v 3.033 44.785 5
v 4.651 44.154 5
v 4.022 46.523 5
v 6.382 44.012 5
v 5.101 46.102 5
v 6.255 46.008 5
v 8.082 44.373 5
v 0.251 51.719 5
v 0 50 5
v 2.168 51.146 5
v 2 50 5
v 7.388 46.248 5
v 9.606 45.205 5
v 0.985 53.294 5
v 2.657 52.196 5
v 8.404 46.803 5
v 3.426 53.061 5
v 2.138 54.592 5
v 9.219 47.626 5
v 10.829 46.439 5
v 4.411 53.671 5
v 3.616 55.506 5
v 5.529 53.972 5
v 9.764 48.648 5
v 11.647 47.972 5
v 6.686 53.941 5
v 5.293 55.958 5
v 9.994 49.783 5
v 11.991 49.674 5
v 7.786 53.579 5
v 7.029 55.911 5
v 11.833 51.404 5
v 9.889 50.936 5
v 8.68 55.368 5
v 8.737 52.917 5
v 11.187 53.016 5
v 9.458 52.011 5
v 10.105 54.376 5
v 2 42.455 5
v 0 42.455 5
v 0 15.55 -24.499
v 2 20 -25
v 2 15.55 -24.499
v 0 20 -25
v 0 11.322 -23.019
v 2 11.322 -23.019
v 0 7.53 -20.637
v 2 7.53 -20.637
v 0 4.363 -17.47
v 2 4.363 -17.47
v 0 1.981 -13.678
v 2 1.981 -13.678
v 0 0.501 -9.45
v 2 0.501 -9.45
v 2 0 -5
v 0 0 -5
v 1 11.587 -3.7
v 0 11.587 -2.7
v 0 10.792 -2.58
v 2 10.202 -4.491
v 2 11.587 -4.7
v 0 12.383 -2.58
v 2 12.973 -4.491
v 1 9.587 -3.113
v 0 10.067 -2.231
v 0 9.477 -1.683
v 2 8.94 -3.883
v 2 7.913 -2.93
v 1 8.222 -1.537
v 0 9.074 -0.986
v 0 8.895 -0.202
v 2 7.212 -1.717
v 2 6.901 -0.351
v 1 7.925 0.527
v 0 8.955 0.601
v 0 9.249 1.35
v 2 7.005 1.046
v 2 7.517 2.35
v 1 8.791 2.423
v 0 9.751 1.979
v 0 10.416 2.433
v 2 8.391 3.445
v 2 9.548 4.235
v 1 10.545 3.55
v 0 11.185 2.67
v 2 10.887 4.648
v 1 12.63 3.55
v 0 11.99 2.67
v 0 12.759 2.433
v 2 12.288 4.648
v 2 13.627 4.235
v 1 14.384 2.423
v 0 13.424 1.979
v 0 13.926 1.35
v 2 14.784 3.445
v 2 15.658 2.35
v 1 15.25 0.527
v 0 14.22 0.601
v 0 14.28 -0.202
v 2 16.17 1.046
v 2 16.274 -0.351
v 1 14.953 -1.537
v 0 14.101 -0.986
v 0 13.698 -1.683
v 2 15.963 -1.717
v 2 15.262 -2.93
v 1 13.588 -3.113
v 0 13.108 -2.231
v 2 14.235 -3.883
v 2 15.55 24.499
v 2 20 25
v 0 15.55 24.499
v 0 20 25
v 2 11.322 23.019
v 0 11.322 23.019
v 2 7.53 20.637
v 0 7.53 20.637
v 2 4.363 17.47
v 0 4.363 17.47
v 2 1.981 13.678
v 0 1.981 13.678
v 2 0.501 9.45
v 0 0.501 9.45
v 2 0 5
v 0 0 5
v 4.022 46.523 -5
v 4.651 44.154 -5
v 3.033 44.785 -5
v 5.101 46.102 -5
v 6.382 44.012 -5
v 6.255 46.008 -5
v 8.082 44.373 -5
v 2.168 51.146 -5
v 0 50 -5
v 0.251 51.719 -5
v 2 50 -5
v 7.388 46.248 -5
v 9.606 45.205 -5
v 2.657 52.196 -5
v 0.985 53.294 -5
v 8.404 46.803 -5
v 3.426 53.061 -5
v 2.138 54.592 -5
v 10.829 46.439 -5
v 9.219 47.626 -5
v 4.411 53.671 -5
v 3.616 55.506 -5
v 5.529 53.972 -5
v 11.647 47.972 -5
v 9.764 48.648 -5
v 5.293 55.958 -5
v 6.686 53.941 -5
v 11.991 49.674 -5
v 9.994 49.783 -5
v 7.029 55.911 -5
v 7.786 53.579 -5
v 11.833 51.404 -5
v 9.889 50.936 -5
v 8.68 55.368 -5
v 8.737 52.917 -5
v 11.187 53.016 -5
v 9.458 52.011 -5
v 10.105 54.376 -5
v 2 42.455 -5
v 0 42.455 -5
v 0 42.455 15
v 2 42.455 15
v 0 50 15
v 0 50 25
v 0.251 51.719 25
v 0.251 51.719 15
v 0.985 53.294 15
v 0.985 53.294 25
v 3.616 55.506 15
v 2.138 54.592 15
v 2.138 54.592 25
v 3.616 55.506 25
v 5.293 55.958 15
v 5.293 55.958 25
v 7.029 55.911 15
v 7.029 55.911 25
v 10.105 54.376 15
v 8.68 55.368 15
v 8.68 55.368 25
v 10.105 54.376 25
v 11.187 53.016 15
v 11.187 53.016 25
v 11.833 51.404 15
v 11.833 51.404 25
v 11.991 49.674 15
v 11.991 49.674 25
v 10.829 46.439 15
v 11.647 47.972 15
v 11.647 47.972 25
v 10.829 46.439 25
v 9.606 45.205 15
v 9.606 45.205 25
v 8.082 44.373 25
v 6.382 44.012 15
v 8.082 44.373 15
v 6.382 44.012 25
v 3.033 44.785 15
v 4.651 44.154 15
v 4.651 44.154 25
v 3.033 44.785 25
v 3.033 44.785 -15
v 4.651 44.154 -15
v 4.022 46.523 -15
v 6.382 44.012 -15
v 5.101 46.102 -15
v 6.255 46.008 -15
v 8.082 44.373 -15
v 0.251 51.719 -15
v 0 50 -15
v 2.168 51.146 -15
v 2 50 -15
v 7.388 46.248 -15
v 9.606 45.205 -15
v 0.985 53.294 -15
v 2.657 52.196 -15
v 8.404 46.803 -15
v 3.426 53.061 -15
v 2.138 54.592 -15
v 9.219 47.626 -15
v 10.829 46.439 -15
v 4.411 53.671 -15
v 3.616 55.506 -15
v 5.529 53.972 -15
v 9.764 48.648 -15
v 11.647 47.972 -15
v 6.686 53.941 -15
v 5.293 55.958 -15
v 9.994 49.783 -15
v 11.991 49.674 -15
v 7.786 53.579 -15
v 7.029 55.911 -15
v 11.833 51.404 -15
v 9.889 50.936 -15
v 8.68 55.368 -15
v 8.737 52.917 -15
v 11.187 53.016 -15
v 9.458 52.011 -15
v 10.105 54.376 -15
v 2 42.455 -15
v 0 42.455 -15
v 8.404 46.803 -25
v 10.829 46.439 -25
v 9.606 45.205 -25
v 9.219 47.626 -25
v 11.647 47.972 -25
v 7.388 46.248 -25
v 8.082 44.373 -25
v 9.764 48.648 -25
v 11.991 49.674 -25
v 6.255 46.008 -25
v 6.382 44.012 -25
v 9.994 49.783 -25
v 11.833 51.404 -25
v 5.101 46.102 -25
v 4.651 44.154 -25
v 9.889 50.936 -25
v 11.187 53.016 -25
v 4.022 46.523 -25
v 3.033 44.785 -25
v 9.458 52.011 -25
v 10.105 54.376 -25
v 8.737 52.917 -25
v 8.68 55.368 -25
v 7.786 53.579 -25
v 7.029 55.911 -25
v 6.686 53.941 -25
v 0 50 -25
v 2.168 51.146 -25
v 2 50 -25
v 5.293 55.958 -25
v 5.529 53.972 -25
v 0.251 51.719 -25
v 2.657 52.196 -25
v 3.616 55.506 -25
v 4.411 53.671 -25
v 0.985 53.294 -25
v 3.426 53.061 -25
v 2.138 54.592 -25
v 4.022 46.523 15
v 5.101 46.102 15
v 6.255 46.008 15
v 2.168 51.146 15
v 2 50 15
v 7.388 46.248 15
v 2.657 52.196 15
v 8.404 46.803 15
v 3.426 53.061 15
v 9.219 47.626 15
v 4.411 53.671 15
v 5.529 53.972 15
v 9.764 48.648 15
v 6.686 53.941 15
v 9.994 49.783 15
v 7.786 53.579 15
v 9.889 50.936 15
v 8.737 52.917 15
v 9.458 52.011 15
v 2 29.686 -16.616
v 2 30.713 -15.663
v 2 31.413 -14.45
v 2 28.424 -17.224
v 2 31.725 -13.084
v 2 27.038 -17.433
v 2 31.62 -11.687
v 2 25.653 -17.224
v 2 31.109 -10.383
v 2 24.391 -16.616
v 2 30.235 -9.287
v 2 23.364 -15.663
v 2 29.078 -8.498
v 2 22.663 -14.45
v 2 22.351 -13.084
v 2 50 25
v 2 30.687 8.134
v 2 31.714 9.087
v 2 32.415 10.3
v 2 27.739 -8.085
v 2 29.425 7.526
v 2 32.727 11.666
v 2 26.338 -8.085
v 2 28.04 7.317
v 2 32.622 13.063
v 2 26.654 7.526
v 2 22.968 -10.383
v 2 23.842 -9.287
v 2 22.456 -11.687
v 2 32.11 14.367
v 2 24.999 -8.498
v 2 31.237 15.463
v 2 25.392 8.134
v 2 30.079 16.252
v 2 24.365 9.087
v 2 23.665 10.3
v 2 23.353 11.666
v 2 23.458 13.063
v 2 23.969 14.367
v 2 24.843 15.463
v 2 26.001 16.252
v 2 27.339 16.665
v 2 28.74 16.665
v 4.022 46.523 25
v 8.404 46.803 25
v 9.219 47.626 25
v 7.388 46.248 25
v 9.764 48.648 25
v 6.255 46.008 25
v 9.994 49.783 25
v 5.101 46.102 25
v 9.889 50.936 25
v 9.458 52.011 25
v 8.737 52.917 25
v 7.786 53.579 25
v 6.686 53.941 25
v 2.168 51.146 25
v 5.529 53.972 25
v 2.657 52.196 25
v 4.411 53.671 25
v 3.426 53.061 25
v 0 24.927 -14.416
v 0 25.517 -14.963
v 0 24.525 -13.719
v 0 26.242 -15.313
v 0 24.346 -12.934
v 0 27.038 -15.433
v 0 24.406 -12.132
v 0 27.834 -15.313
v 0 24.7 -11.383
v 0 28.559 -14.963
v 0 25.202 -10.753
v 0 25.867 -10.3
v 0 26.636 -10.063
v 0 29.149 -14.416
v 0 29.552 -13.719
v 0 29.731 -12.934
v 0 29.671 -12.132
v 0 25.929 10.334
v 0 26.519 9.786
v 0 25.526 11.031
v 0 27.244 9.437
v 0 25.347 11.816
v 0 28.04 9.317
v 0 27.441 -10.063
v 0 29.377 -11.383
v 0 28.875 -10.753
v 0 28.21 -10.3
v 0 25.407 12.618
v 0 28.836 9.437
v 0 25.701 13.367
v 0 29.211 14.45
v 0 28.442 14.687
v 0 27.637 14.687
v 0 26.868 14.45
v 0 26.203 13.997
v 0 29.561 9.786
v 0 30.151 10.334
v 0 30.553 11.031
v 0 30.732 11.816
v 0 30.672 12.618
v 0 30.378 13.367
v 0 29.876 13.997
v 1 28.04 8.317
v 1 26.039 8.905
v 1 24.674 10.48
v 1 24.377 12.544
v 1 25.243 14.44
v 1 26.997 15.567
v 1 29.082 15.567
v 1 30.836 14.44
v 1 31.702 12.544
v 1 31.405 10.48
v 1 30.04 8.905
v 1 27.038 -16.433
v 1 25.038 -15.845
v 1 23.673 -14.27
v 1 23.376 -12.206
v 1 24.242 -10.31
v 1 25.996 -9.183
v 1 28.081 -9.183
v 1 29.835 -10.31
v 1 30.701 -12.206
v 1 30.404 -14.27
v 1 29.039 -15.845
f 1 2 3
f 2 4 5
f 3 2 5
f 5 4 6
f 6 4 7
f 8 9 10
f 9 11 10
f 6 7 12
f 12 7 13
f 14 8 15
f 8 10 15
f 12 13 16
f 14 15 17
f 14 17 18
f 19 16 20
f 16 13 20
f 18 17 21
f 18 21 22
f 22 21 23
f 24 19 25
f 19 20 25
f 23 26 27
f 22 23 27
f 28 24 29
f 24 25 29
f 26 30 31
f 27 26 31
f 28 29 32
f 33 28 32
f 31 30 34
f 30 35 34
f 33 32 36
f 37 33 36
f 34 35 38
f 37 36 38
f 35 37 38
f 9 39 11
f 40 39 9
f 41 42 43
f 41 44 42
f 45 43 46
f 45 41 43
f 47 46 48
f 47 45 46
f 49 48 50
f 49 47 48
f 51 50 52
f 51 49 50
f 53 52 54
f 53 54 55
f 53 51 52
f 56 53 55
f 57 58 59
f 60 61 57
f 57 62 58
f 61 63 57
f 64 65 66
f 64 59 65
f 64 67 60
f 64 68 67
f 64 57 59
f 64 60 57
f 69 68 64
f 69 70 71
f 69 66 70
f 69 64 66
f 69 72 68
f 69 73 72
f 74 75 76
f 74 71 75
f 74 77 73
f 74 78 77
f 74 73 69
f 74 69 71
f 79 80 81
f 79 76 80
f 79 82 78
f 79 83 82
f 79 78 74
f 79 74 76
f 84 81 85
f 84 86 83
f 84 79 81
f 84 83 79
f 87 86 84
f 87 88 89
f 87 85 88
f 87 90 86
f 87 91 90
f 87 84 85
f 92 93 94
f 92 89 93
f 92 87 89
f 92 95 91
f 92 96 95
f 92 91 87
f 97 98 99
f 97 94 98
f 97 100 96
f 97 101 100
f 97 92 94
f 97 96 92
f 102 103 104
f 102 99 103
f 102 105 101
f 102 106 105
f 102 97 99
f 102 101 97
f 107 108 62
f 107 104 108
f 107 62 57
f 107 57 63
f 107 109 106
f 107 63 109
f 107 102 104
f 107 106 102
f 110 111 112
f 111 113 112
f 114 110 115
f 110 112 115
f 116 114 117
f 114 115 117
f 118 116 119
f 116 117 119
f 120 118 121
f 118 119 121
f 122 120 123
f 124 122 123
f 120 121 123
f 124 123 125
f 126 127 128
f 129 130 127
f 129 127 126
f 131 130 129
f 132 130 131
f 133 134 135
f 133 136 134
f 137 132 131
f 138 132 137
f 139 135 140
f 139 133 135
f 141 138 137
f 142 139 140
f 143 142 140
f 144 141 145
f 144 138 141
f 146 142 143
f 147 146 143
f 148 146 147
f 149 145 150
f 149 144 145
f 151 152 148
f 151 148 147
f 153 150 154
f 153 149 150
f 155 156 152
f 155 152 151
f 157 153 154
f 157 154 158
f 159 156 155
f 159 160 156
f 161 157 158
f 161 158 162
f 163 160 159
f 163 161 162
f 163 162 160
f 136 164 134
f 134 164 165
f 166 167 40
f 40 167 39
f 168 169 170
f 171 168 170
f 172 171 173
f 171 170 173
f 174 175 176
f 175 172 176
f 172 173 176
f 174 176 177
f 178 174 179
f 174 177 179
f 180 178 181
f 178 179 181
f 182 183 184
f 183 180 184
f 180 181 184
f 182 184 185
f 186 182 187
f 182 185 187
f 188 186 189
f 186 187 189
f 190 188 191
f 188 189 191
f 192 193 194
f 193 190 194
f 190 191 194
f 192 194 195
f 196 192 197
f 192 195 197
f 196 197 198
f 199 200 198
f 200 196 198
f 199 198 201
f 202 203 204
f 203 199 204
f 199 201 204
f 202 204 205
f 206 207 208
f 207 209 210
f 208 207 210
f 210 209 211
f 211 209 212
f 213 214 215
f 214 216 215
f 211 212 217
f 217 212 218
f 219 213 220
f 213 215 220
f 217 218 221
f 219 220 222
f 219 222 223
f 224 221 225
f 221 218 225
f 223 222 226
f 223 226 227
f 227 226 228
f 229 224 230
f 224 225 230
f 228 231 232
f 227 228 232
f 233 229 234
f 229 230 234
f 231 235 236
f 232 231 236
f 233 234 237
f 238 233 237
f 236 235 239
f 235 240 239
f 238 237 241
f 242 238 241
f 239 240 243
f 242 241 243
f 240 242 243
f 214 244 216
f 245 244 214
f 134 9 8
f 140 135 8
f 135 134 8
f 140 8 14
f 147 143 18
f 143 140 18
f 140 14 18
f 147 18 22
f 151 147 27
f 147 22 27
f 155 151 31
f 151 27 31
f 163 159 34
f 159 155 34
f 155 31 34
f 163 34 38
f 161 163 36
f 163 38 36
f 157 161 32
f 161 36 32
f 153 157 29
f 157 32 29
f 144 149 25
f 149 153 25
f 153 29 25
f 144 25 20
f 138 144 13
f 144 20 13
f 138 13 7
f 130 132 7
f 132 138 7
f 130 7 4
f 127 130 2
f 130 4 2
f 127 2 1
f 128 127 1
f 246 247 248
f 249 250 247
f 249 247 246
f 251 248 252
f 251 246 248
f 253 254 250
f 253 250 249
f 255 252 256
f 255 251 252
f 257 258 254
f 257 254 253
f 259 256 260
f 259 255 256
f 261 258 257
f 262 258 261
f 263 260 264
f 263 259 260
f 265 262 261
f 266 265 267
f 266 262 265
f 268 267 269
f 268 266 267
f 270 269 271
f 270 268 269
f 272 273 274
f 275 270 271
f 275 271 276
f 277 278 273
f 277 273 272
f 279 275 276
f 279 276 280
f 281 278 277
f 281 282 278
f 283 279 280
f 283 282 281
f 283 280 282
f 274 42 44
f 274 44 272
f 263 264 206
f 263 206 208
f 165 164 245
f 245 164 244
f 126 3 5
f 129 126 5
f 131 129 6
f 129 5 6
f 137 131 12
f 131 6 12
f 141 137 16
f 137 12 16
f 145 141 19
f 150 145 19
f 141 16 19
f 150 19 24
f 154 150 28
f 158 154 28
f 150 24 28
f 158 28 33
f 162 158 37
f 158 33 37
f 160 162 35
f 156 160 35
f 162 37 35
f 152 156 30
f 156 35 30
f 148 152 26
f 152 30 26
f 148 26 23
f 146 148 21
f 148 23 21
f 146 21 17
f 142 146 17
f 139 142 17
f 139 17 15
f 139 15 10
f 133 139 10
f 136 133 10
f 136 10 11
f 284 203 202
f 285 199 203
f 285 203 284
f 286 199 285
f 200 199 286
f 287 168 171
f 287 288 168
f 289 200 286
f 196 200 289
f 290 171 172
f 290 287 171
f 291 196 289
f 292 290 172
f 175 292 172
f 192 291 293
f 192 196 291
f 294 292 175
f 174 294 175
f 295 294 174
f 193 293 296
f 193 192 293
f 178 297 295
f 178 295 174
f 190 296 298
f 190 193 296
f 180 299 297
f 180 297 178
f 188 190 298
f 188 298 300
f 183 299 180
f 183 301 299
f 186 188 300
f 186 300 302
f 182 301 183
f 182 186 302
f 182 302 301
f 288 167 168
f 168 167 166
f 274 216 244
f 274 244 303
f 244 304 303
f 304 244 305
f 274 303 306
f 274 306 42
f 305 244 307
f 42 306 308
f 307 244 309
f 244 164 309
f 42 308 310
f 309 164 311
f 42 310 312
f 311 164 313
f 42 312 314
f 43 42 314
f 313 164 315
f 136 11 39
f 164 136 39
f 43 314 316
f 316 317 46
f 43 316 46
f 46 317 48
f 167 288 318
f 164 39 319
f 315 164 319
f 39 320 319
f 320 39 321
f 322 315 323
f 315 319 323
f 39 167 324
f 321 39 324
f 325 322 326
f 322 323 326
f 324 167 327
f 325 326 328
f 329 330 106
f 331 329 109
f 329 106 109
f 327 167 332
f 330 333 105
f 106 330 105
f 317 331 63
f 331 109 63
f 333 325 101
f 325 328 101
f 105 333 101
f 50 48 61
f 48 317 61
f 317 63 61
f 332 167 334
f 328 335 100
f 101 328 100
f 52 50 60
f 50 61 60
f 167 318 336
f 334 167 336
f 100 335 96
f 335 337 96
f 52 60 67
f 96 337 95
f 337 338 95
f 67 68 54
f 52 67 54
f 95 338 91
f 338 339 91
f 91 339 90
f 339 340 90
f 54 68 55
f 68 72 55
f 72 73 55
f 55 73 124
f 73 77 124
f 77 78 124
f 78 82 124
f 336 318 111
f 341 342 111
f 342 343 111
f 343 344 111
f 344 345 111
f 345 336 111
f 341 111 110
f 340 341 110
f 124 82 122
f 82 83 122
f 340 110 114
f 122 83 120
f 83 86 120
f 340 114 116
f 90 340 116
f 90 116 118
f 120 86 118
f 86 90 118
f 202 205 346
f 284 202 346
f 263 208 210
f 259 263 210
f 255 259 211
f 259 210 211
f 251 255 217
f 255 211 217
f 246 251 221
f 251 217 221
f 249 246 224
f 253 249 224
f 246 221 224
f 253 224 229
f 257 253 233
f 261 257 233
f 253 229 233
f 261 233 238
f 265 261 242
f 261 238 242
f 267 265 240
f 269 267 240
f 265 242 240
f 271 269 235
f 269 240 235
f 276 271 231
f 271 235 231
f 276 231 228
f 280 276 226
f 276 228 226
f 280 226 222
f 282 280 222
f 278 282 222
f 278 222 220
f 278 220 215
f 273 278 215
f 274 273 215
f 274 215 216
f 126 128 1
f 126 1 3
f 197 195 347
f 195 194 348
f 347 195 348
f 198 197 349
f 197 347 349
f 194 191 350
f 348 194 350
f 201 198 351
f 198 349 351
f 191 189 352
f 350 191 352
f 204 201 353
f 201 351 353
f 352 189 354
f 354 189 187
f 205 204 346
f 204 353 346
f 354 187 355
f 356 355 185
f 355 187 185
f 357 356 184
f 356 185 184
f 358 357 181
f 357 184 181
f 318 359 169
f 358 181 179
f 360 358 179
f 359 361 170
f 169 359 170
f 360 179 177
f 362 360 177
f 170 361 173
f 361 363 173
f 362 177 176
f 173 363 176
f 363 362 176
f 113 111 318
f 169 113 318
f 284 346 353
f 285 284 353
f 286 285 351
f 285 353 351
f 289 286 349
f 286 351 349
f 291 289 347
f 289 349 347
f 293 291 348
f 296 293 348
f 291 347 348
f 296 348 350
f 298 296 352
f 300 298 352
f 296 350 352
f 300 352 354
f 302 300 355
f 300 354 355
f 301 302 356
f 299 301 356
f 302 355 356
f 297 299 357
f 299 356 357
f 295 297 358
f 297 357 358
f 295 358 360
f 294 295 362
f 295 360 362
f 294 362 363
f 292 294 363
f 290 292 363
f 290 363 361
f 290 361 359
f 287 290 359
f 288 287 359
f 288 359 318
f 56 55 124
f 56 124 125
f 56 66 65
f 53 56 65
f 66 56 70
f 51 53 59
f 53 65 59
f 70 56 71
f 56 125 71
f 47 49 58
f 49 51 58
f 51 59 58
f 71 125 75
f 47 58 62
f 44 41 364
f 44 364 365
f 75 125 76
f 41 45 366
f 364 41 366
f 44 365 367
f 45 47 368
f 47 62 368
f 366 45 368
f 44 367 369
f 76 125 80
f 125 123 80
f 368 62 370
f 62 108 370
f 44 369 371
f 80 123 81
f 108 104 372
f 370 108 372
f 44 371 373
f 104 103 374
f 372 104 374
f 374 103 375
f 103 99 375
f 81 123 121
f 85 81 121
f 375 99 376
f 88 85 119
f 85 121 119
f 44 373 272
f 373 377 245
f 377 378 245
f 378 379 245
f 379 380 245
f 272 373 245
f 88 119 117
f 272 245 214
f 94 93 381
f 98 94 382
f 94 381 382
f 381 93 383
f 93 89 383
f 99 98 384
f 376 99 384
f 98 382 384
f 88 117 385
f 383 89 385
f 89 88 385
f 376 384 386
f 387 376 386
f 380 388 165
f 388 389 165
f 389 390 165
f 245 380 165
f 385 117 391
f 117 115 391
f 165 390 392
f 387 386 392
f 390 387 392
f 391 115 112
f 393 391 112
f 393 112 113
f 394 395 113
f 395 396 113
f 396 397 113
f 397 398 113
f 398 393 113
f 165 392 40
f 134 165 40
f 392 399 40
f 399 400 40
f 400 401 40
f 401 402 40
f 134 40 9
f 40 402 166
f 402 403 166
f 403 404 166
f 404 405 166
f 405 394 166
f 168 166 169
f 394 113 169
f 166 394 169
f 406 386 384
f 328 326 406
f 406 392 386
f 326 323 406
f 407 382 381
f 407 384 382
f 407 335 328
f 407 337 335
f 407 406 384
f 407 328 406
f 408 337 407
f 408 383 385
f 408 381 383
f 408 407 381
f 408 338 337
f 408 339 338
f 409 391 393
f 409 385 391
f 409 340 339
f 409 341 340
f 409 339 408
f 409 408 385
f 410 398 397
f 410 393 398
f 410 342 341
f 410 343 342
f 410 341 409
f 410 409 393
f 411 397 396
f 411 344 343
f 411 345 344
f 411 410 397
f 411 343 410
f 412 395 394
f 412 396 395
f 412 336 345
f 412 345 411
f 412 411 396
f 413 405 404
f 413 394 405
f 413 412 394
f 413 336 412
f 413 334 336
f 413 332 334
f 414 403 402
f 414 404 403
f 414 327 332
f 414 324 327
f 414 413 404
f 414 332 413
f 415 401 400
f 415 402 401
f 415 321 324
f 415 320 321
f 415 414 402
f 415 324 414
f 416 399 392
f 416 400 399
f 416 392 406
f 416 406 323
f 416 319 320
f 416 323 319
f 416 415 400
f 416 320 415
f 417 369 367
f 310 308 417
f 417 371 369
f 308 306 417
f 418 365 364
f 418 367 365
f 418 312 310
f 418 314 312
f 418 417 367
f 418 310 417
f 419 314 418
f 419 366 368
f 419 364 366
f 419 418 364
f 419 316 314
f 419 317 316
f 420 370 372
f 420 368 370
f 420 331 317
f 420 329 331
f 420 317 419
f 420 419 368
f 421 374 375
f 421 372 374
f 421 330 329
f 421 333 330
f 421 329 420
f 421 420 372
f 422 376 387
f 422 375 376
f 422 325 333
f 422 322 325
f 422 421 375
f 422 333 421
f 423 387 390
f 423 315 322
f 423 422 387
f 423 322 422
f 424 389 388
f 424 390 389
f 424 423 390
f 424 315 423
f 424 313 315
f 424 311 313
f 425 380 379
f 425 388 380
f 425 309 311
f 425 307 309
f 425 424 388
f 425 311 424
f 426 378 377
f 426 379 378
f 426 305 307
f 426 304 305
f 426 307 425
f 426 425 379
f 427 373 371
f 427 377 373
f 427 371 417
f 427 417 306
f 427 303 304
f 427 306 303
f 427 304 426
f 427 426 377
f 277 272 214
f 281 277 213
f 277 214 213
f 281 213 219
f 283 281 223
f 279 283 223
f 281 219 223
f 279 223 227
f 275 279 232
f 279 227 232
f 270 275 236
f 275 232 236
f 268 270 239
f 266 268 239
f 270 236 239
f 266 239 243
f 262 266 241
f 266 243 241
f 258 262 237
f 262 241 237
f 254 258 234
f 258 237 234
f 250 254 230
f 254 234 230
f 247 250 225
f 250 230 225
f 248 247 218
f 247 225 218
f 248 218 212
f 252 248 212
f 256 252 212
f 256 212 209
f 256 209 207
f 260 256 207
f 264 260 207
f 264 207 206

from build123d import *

# Parameters (mm, degrees)
BOSS_EXTRUDE1_DEPTH                          = 25
SKETCH2_W                                    = 10
SKETCH2_H                                    = 20.590421557
CUT_EXTRUDE1_DEPTH                           = 11
CUT_EXTRUDE1_DEPTH_BACK                      = 3
FILLET1_R                                    = 20
CSK_FOR_M4_COUNTERSUNK_FLAT_HEAD_SCR_2_COUNT = 2
CSK_FOR_M4_COUNTERSUNK_FLAT_HEAD_SCR_2_PITCH = 20.373860658
CSK_FOR_M4_COUNTERSUNK_FLAT_HEAD_SCR_3_COUNT = 2
CSK_FOR_M4_COUNTERSUNK_FLAT_HEAD_SCR_3_PITCH = 20.021215351


with BuildPart() as part:
    # Sketch1 → Boss-Extrude1 (new body, symmetric)
    with BuildSketch(Plane.XY):
        with BuildLine():
            Line((0, 0), (0, 50))
            ThreePointArc((0, 50), (11.186683916, 53.016340491), (3.032769985, 44.785065097))
            Line((3.032769985, 44.785065097), (4.021846657, 46.523376732))
            ThreePointArc((4.021846657, 46.523376732), (9.457789277, 52.01089366), (2, 50))
            Line((2, 50), (2, 0))
            Line((2, 0), (0, 0))
        make_face()
    extrude(amount=BOSS_EXTRUDE1_DEPTH, both=True)

    # Sketch2 → Cut-Extrude1 (cut, two sides)
    with BuildSketch(Plane(origin=(2, 0, 0), x_dir=(0, 0, -1), z_dir=(1, 0, 0))) as cut_extrude1_sk:
        with Locations((-10, 52.749880228)):
            Rectangle(SKETCH2_W, SKETCH2_H)
        with Locations((10, 52.749880228)):
            Rectangle(SKETCH2_W, SKETCH2_H)
    extrude(amount=CUT_EXTRUDE1_DEPTH, mode=Mode.SUBTRACT)
    extrude(cut_extrude1_sk.sketch, amount=-CUT_EXTRUDE1_DEPTH_BACK, mode=Mode.SUBTRACT)

    # Fillet1
    fillet1_edges = [part.edges().sort_by_distance(p)[0] for p in [
        (1, 0, 25),
        (1, 0, -25),
    ]]
    fillet(fillet1_edges, radius=FILLET1_R)

    # Sketch4 → CSK for M4 Countersunk Flat Head Screw1 (revolve, cut)
    with BuildSketch(Plane(origin=(2, 11.587467643, 0), x_dir=(0, 0, -1), z_dir=(0, 1, 0))):
        Polygon((0, 0), (0, 2), (2.25, 2), (2.25, 2.45), (4.7, 0), align=None)
    csk_for_m4_countersunk_flat_head_screw1 = revolve(axis=Axis((8.35, 11.587467643, 0), (-1, 0, 0)), mode=Mode.SUBTRACT)

    # CSK for M4 Countersunk Flat Head Scr 2: CSK for M4 Countersunk Flat Head Screw1 ×2
    with Locations(*[Vector(0, 0.807519759, 0.58984052) * (i * CSK_FOR_M4_COUNTERSUNK_FLAT_HEAD_SCR_2_PITCH) for i in range(1, CSK_FOR_M4_COUNTERSUNK_FLAT_HEAD_SCR_2_COUNT)]):
        add(csk_for_m4_countersunk_flat_head_screw1, mode=Mode.SUBTRACT)

    # CSK for M4 Countersunk Flat Head Scr 3: CSK for M4 Countersunk Flat Head Screw1 ×2
    with Locations(*[Vector(0, 0.77172393, -0.635957683) * (i * CSK_FOR_M4_COUNTERSUNK_FLAT_HEAD_SCR_3_PITCH) for i in range(1, CSK_FOR_M4_COUNTERSUNK_FLAT_HEAD_SCR_3_COUNT)]):
        add(csk_for_m4_countersunk_flat_head_screw1, mode=Mode.SUBTRACT)


solid = part.part
